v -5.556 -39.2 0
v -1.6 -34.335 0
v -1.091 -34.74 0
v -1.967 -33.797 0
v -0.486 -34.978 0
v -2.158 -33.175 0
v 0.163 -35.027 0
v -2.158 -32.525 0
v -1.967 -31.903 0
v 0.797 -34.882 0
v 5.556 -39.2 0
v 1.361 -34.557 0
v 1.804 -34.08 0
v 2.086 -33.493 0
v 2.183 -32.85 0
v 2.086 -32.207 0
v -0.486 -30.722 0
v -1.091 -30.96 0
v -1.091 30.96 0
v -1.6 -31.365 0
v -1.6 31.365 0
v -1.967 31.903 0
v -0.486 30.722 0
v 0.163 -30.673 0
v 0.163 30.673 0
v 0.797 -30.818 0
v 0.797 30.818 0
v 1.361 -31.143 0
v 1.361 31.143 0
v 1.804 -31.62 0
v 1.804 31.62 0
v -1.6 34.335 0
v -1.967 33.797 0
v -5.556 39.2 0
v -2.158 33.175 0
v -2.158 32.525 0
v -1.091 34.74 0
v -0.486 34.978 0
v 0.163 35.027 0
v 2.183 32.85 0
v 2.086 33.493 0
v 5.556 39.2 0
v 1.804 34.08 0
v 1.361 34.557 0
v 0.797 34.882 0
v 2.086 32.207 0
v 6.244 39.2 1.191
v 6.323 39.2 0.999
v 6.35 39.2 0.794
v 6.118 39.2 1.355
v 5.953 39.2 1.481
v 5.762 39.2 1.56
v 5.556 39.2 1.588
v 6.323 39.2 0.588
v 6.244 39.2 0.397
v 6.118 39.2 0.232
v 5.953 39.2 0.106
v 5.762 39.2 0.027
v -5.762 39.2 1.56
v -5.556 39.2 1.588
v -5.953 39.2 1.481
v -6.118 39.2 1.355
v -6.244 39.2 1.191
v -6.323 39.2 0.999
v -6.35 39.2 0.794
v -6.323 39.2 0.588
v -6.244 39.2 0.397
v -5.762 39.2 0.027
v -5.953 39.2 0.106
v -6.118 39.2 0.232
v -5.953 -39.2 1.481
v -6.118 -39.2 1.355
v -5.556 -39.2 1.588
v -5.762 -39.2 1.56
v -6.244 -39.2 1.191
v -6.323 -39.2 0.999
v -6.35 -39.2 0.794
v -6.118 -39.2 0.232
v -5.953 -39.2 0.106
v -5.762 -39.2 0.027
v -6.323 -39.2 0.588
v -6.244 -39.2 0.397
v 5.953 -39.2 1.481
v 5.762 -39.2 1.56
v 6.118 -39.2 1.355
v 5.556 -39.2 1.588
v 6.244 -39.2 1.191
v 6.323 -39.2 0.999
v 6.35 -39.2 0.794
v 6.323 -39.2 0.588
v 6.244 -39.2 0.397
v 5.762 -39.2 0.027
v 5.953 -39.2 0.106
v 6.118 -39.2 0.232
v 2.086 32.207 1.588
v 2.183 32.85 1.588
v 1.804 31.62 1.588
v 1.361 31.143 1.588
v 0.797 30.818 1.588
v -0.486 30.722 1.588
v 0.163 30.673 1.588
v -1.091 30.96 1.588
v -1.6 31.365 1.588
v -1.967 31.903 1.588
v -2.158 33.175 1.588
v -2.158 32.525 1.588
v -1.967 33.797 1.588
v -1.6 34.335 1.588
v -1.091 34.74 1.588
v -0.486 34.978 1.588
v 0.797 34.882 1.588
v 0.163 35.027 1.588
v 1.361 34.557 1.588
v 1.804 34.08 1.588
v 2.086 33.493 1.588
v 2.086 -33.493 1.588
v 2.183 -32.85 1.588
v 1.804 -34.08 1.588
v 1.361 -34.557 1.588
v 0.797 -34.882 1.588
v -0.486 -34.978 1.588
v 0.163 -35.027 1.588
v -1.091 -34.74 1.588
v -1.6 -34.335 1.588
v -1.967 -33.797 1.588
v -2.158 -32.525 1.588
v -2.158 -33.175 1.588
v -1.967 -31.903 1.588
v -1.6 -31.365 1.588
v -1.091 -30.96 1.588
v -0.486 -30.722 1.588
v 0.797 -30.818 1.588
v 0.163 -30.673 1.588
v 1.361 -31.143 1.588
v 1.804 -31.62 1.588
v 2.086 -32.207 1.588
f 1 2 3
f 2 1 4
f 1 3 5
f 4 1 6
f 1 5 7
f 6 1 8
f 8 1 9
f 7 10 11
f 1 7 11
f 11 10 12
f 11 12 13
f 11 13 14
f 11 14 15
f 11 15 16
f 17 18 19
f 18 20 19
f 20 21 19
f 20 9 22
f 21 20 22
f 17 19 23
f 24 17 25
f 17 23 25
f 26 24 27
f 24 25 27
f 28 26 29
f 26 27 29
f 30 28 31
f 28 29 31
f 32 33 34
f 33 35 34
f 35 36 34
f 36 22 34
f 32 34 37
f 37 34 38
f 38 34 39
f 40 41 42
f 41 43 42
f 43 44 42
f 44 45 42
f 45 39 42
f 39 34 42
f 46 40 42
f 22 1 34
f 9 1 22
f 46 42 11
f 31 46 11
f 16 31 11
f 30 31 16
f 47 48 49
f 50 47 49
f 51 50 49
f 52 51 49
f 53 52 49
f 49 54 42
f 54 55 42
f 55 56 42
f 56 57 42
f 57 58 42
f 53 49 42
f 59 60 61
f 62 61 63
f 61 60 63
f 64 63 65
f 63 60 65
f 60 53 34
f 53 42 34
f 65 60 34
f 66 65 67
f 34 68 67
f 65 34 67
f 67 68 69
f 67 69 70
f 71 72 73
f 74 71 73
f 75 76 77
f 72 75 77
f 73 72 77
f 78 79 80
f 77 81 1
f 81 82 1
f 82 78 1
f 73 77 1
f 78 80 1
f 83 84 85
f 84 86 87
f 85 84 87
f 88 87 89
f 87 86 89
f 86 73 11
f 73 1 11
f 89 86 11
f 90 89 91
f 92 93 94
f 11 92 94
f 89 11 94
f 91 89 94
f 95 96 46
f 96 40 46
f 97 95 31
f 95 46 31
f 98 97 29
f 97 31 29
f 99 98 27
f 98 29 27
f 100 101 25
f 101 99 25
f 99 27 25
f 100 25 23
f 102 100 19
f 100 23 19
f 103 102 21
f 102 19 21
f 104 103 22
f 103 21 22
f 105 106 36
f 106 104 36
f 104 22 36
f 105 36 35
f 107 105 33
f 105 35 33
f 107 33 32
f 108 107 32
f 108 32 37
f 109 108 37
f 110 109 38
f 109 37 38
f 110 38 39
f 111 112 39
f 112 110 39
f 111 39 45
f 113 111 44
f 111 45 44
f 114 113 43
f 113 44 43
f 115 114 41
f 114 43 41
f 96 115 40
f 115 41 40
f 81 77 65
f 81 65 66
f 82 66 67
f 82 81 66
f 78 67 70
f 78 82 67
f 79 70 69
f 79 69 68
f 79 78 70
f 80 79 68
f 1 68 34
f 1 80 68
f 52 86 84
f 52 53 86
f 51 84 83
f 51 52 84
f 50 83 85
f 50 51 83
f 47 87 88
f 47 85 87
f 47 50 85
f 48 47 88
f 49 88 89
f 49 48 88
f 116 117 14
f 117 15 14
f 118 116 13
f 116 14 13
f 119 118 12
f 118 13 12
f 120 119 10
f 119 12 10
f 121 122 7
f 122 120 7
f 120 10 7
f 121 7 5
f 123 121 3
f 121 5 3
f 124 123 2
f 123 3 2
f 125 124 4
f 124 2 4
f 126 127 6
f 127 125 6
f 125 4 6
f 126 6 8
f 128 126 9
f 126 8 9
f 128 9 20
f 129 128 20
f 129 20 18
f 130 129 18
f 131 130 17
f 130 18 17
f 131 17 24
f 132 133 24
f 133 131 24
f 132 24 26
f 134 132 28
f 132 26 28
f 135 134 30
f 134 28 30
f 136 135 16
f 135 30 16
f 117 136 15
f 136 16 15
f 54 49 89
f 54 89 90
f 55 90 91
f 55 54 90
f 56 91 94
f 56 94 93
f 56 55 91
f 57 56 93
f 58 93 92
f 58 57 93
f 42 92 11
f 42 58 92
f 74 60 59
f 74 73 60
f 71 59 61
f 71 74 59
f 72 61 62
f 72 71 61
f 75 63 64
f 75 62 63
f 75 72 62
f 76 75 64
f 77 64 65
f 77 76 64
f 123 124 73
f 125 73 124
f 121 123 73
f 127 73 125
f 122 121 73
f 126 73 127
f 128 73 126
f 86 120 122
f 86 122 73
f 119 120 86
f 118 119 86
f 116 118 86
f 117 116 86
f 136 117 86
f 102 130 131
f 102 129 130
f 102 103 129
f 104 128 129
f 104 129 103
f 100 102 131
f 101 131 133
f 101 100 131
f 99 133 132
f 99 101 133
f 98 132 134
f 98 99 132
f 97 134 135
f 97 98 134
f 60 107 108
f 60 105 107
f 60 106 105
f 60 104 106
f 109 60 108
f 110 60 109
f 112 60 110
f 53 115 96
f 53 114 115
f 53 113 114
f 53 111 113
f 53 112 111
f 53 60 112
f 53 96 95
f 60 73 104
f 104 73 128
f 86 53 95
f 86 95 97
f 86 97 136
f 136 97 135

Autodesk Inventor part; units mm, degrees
ref_plane "YZ Plane" through (0, 0, 0) normal (1, 0, 0) x (0, 1, 0)
ref_plane "XZ Plane" through (0, 0, 0) normal (0, 1, 0) x (-1, 0, 0)
ref_plane "XY Plane" through (0, 0, 0) normal (0, 0, 1) x (1, 0, 0)
sketch "Sketch1" plane through (0, 0, 0) normal (0, 0, 1) x (1, 0, 0)
  circle A0 centre (0, 32.85) radius 2.1828
  circle A1 centre (0, -32.85) radius 2.1828
  line L0 (-6.35, -39.2) -> (6.35, -39.2)
  line L1 (6.35, -39.2) -> (6.35, 39.2)
  line L2 (6.35, 39.2) -> (-6.35, 39.2)
  line L3 (-6.35, 39.2) -> (-6.35, -39.2)
  line L4 (-6.35, -39.2) -> (6.35, 39.2) construction
  line L5 (6.35, -39.2) -> (-6.35, 39.2) construction
  point P0 (0, 0)
  dimension "d0" = 4.3656
  dimension "d1" = 4.3656
  dimension "d2" = 65.7
  dimension "d3" = 32.85
  dimension "d4" = 32.85
  dimension "d5" = 12.7
  dimension "d6" = 6.35
extrude "Extrusion1" add sketch "Sketch1" along normal blind 1.5875
fillet "Fillet1" radius 0.7937 4 edges at (-6.35, 0, 0) (-6.35, 0, 1.5875) (6.35, 0, 0) (6.35, 0, 1.5875)
properties part number "Part H"
